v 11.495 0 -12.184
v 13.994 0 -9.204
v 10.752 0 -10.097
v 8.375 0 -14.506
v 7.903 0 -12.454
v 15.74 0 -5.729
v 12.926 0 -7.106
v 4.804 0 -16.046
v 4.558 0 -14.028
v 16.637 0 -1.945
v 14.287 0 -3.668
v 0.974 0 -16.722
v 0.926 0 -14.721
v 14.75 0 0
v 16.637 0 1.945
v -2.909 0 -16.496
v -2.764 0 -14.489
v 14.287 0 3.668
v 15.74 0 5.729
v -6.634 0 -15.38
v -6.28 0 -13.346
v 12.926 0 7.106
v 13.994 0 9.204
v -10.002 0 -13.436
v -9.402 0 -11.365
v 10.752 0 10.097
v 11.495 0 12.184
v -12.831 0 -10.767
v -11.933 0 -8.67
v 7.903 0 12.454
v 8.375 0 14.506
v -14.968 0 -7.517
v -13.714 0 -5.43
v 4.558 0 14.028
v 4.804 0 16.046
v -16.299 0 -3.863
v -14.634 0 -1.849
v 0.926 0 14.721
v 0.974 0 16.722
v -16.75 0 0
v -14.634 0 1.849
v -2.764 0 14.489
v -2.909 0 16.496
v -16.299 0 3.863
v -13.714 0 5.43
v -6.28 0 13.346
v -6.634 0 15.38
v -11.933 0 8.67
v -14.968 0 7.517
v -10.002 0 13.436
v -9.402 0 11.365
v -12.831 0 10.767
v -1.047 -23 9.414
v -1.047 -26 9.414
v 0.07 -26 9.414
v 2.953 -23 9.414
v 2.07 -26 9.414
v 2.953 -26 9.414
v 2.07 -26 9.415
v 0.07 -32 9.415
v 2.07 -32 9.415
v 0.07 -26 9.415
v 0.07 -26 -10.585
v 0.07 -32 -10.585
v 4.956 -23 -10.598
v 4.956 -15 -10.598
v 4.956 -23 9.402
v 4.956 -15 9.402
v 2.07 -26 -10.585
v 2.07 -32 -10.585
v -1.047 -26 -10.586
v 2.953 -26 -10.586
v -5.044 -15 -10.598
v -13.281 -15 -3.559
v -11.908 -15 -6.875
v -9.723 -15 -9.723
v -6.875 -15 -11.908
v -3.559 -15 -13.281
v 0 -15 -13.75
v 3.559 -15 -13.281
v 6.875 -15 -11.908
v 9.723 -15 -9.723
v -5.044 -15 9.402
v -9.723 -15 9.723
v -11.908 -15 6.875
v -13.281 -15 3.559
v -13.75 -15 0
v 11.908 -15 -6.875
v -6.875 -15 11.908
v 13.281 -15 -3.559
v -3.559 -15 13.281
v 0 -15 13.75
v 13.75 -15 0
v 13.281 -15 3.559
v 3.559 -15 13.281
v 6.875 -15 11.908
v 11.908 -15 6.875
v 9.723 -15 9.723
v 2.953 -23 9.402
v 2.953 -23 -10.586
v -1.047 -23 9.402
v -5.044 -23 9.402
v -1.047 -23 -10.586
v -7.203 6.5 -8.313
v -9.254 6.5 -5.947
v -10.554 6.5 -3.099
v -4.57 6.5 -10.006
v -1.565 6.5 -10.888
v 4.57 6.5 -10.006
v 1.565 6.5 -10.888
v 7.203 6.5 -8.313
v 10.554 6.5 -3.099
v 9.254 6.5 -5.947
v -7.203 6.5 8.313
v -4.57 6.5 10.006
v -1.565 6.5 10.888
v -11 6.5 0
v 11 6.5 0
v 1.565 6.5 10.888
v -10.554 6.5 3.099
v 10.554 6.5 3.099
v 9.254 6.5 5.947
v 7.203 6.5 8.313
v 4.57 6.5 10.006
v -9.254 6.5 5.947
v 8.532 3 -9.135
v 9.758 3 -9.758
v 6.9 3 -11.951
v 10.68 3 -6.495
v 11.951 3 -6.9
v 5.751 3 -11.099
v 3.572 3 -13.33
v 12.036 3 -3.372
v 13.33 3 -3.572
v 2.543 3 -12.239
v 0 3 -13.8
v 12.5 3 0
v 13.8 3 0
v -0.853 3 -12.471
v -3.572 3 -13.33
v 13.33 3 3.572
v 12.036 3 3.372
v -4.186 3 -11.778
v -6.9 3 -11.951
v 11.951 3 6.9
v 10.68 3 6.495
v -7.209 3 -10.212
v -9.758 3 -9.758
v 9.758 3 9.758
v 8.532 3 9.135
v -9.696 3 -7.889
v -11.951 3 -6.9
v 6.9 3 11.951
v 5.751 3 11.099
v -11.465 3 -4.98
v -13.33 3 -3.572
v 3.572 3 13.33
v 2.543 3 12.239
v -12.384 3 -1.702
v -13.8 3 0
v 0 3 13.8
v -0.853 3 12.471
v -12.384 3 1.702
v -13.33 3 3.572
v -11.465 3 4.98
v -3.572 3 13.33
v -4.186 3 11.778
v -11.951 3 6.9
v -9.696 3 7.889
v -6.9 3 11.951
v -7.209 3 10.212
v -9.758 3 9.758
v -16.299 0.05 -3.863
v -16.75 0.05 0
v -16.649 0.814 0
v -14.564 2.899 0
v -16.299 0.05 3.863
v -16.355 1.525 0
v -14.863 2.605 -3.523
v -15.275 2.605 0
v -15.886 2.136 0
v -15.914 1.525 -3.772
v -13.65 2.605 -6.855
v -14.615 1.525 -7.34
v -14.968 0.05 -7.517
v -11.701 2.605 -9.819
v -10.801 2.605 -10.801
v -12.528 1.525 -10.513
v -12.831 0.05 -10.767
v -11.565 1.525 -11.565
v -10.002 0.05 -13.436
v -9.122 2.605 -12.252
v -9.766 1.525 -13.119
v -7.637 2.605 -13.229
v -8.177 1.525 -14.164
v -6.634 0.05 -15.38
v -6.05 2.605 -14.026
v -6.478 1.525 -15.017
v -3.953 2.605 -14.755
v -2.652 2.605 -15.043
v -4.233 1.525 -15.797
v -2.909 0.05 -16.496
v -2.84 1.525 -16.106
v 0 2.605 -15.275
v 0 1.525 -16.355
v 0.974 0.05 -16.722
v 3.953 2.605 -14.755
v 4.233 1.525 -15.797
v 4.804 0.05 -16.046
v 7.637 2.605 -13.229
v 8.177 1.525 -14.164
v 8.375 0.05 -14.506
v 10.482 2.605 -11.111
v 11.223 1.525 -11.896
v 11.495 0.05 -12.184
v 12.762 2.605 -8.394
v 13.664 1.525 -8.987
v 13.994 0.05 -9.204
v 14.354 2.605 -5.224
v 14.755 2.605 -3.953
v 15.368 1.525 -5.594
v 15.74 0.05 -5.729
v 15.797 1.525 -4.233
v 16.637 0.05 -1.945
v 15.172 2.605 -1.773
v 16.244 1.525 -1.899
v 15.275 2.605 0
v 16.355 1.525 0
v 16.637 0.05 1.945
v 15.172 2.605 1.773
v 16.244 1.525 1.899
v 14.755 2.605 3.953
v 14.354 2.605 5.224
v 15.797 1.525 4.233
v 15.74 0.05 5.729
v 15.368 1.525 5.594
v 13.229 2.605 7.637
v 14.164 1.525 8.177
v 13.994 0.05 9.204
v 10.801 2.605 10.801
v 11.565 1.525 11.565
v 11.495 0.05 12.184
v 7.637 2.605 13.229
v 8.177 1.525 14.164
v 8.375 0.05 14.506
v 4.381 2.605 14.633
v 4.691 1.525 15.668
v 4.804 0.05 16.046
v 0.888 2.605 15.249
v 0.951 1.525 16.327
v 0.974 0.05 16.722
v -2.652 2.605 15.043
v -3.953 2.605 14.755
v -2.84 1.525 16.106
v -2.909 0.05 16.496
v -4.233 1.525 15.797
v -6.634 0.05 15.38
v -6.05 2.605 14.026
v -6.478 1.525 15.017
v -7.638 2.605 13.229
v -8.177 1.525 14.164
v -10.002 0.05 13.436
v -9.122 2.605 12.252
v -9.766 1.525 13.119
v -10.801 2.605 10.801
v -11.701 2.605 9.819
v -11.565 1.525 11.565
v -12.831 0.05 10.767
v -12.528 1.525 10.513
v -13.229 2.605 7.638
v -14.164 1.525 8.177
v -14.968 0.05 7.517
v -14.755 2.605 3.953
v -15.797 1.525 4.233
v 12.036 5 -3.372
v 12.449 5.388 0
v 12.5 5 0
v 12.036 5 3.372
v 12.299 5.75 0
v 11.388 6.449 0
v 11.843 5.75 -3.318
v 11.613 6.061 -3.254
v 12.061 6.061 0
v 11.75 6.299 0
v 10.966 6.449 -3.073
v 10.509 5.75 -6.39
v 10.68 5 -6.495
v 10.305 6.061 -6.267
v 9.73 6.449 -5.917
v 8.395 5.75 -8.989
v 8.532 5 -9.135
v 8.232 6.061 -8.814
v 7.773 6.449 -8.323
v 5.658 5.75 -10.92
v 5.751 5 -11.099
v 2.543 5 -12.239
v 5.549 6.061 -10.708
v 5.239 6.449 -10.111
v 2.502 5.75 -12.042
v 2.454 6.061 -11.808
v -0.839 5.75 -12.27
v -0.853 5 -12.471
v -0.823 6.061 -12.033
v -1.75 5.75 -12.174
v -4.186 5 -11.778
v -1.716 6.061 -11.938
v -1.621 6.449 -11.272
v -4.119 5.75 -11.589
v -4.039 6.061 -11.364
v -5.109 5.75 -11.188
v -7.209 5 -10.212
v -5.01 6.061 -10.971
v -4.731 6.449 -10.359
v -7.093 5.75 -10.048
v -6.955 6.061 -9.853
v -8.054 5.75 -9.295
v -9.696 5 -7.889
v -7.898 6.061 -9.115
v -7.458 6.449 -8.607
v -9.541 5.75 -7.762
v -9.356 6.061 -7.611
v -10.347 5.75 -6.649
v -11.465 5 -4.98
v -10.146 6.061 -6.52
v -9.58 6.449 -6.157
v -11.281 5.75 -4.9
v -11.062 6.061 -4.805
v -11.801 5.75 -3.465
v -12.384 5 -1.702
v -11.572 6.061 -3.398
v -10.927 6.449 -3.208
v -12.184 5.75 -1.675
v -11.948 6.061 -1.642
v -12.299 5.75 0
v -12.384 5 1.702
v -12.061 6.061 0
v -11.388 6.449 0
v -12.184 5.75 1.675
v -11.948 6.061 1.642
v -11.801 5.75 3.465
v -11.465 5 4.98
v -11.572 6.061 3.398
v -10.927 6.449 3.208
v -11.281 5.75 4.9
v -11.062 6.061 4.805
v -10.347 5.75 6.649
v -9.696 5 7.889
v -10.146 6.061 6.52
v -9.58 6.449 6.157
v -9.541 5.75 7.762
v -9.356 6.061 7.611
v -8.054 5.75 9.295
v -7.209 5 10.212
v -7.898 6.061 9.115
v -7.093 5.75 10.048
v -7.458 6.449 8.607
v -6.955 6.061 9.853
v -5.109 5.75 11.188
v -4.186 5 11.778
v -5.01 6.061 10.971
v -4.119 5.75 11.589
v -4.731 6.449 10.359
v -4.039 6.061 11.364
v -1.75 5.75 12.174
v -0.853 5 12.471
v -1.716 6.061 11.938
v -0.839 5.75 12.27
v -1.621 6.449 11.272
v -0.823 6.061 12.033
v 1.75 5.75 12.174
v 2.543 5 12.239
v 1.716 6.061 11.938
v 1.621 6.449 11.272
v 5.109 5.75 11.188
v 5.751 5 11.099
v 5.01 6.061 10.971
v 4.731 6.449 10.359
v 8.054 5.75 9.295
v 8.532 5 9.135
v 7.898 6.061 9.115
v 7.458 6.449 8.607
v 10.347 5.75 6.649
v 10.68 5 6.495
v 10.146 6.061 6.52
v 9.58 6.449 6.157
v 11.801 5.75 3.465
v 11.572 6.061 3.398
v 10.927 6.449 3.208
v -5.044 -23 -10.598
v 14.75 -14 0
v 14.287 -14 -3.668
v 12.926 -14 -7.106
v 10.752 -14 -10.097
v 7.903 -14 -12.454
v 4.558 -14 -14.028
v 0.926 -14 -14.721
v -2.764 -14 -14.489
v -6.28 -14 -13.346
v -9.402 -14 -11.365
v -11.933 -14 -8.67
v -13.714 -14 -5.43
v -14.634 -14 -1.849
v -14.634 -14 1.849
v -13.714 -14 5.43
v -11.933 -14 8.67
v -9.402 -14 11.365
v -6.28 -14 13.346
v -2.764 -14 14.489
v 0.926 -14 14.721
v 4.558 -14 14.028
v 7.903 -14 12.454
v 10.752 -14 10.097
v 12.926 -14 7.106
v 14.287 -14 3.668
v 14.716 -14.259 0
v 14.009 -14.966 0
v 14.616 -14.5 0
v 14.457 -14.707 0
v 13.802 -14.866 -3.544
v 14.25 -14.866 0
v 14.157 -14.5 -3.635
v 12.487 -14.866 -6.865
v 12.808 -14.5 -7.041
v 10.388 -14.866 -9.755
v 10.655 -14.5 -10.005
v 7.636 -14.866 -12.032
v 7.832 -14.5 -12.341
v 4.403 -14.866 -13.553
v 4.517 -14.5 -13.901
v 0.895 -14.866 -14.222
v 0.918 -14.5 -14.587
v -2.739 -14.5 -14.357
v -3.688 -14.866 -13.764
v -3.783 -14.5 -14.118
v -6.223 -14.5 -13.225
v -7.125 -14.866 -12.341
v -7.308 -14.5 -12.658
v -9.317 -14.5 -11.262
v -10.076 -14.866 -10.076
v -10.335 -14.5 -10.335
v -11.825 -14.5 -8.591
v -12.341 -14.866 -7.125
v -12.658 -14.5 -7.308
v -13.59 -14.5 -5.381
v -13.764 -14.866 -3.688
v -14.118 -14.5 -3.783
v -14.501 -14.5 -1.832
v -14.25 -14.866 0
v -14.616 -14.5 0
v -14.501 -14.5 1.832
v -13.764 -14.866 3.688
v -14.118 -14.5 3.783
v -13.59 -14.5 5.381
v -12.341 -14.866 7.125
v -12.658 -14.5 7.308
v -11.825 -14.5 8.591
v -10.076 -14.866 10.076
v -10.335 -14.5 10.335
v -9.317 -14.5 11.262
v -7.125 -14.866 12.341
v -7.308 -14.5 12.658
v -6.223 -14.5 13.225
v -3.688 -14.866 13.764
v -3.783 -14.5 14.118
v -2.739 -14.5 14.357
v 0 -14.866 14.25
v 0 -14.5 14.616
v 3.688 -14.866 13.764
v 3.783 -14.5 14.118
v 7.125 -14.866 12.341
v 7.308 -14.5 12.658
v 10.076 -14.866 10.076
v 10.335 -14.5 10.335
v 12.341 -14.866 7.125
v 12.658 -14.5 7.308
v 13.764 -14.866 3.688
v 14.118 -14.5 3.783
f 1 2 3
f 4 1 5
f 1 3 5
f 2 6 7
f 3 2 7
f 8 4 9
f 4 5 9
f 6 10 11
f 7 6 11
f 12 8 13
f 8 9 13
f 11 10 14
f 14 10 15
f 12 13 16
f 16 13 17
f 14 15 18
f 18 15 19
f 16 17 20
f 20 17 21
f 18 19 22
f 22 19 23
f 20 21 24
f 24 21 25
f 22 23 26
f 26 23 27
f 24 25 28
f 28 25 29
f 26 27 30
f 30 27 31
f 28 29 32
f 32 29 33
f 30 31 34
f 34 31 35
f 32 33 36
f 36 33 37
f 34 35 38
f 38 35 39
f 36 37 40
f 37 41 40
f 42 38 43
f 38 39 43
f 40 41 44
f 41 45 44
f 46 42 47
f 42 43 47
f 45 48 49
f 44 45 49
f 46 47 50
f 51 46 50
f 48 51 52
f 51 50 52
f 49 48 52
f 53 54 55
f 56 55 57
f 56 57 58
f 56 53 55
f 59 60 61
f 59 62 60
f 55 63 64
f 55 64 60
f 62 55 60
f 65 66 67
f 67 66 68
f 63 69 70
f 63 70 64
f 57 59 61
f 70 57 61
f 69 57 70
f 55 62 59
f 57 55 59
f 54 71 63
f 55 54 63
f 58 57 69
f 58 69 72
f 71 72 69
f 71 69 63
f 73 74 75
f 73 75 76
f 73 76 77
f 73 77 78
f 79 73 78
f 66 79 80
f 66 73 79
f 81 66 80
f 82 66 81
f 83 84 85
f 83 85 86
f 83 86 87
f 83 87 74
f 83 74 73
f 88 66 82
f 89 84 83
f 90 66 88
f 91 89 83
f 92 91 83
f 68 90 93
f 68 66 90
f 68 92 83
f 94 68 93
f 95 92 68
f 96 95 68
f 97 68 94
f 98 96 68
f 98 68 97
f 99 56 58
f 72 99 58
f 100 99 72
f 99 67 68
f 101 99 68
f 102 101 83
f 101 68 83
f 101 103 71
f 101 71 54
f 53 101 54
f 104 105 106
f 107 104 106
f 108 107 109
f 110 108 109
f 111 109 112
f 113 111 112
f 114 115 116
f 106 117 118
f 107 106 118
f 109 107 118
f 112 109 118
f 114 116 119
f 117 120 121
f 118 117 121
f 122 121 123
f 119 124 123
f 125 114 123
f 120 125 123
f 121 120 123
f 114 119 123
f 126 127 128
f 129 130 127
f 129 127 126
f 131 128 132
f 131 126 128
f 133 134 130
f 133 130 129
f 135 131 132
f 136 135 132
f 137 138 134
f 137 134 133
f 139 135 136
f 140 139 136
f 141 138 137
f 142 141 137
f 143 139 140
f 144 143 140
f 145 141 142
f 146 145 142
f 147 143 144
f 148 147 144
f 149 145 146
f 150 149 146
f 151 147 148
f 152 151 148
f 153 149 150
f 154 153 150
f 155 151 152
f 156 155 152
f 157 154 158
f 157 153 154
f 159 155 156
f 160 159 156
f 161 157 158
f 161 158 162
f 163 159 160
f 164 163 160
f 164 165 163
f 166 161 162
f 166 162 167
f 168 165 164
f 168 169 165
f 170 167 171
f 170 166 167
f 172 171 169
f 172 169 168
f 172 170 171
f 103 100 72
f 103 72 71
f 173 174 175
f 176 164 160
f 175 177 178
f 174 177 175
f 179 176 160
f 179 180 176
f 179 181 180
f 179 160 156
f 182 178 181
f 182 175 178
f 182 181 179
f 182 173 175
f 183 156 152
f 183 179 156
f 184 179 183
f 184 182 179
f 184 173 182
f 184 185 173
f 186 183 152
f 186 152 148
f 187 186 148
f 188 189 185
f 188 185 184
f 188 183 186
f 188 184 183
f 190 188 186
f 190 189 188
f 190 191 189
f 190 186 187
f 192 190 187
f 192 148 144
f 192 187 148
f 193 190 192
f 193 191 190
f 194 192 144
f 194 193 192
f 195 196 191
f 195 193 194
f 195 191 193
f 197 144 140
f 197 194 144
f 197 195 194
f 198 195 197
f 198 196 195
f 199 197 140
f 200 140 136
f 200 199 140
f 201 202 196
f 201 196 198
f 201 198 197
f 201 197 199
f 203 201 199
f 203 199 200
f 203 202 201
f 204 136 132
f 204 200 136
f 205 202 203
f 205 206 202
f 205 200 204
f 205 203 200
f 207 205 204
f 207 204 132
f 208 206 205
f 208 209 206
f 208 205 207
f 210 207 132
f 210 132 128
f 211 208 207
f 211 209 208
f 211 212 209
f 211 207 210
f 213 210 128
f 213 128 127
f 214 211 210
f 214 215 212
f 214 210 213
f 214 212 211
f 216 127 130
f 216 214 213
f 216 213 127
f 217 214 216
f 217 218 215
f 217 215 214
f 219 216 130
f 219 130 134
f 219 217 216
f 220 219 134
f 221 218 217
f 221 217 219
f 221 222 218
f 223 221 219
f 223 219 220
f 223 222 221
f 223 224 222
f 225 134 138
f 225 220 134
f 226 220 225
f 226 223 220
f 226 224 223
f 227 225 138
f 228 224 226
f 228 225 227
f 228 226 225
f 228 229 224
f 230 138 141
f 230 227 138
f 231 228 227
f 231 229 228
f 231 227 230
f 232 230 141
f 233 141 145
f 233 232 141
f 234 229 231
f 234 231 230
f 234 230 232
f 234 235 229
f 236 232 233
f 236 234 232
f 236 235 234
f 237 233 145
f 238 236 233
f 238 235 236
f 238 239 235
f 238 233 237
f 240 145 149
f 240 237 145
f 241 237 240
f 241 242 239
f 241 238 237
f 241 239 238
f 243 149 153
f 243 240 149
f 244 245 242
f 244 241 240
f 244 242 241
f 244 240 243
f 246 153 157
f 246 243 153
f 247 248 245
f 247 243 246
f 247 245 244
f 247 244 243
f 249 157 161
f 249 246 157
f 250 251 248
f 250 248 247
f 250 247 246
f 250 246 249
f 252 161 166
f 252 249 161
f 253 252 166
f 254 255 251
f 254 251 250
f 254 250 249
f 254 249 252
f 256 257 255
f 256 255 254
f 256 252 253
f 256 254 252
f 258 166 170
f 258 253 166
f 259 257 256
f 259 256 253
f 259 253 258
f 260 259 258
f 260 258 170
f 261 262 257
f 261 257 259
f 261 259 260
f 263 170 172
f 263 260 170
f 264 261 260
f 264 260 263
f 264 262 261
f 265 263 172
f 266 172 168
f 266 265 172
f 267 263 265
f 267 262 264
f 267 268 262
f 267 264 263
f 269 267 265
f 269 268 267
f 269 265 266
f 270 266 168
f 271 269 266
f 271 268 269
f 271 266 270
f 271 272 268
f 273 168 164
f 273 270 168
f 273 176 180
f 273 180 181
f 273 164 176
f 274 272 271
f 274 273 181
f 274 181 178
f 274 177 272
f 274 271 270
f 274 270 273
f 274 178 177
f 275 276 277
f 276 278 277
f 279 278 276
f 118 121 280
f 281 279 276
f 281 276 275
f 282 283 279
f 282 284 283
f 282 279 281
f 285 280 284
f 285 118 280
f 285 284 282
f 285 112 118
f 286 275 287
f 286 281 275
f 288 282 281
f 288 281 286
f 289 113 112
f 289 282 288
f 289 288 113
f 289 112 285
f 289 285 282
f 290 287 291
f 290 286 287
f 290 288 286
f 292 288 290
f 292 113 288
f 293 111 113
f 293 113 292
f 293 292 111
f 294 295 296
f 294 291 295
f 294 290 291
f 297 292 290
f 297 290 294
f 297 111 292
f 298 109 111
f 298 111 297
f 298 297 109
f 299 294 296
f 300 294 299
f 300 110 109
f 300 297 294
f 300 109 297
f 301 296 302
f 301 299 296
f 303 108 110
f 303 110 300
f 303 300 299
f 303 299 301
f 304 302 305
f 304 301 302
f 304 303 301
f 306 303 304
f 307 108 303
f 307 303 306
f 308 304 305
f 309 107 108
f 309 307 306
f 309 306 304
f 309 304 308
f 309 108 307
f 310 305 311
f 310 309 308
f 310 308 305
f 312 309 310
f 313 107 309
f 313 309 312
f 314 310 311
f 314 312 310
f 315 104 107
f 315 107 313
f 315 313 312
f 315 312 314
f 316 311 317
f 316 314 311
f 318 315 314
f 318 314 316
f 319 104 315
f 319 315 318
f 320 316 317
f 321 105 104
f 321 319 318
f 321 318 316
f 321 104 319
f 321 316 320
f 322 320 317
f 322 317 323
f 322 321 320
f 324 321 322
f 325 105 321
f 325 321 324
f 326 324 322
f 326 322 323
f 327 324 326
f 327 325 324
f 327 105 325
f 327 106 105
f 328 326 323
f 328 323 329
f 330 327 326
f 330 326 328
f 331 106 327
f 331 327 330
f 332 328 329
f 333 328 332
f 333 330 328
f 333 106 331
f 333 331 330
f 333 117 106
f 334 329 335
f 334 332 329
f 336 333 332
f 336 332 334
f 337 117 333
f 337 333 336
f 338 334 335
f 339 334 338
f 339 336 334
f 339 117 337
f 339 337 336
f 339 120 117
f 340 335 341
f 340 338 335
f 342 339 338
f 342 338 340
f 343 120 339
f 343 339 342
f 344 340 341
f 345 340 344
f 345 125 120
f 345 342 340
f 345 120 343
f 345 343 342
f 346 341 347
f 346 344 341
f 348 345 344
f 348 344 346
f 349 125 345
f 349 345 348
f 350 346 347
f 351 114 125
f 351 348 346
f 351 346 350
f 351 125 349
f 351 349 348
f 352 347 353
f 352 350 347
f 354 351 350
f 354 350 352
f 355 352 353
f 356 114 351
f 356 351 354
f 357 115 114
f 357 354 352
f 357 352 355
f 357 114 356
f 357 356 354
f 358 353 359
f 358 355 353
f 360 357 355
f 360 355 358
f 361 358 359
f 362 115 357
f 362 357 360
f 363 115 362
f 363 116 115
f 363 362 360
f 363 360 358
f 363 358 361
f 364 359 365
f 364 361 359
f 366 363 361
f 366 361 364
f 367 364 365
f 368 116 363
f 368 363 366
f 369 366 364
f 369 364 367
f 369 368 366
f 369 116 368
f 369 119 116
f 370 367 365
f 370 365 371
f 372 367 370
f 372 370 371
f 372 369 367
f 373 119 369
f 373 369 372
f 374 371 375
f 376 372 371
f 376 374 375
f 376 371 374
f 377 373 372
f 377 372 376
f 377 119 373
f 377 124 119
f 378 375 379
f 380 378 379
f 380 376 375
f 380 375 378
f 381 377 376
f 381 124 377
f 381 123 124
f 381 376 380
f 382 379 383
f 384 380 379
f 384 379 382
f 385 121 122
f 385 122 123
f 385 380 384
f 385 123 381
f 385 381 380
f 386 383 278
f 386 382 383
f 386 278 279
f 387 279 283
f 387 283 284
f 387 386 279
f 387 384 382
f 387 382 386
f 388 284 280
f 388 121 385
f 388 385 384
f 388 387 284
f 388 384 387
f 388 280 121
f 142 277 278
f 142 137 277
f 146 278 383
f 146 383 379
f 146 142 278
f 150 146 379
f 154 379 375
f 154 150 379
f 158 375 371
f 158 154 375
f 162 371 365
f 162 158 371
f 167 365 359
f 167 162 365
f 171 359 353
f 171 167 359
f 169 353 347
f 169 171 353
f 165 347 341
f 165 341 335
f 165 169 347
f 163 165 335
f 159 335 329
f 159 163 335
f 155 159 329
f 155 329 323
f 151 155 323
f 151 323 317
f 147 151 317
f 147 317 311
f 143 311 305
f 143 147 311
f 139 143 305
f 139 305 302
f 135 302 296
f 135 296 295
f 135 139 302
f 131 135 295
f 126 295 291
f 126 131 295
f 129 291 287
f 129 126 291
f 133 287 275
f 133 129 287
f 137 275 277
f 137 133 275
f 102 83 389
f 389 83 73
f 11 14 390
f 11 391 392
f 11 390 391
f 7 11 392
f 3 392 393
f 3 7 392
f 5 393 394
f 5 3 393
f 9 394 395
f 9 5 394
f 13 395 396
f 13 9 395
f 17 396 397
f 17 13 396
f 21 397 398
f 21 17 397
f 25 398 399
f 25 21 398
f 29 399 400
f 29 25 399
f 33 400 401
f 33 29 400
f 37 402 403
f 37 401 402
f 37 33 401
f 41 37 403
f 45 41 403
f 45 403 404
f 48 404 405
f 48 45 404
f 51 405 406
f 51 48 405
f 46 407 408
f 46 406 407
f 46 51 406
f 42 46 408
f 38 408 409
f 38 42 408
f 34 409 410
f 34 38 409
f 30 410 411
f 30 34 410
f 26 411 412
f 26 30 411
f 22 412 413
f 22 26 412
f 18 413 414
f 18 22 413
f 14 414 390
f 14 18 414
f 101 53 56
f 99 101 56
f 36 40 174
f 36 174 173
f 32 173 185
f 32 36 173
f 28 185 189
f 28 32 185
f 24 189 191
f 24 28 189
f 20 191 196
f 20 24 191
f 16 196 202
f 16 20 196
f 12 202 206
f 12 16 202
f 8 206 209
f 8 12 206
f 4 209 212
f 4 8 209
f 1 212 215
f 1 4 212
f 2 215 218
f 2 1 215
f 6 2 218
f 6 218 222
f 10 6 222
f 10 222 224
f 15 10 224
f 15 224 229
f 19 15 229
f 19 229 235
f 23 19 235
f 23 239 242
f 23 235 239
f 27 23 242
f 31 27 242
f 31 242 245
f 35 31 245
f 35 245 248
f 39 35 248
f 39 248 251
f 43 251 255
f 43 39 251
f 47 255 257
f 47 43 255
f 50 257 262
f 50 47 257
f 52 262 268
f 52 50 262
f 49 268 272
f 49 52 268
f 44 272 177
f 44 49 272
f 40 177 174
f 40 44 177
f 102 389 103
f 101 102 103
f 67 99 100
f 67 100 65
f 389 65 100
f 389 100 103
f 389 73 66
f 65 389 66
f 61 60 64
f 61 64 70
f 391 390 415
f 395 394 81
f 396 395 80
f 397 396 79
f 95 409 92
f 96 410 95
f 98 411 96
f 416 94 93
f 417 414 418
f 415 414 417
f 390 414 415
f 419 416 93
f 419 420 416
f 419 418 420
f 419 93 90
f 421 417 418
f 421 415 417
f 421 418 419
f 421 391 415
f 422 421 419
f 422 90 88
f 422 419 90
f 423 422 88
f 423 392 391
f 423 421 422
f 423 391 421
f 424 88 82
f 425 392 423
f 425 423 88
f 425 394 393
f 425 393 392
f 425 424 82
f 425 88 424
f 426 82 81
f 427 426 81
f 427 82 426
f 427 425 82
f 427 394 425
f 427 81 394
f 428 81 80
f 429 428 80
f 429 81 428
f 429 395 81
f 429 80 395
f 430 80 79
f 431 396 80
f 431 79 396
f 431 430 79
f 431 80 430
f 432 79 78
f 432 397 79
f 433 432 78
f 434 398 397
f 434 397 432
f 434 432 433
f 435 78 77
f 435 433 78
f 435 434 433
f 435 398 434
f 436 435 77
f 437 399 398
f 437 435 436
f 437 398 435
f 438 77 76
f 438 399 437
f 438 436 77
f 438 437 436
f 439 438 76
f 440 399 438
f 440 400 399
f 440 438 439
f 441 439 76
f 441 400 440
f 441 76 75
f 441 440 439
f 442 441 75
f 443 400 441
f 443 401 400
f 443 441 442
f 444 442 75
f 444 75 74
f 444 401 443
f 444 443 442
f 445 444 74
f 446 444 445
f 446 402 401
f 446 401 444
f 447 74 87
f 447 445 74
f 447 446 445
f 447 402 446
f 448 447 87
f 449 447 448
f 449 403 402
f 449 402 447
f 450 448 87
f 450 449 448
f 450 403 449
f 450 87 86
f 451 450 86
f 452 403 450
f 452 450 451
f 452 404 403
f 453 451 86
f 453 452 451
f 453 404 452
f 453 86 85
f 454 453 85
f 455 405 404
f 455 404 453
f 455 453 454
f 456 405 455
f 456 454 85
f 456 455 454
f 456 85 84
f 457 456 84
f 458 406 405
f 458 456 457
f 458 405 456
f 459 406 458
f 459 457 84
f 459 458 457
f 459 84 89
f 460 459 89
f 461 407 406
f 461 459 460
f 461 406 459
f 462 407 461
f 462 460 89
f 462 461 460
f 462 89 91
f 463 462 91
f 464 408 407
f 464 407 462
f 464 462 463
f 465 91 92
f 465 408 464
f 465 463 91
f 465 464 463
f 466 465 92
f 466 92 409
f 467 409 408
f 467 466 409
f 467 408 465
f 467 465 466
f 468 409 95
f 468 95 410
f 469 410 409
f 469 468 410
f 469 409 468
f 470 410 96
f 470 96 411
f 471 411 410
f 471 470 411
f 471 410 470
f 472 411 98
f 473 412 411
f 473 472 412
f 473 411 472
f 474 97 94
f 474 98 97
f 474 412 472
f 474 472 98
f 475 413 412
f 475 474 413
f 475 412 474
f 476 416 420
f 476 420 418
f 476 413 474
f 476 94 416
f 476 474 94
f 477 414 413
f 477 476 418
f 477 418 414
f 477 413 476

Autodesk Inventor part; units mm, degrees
ref_plane "YZ Plane" through (0, 0, 0) normal (1, 0, 0) x (0, 1, 0)
ref_plane "XZ Plane" through (0, 0, 0) normal (0, 1, 0) x (-1, 0, 0)
ref_plane "XY Plane" through (0, 0, 0) normal (0, 0, 1) x (1, 0, 0)
sketch "Sketch1" plane through (0, 0, 0) normal (0, 1, 0) x (-1, 0, 0)
  circle A0 centre (0, 0) radius 12.5
  circle A1 centre (0, 0) radius 16.75
  dimension "d0" = 25
  dimension "d1" = 33.5
extrude "Extrusion1" add sketch "Sketch1" along normal blind 3
sketch "Sketch2" plane through (0, 0, 0) normal (0, -1, 0) x (1, 0, 0)
  circle A0 centre (0, 0) radius 12.5 projected
  circle A1 centre (0, 0) radius 12.5
  dimension "d6" = 25
extrude "Extrusion2" add sketch "Sketch2" against normal blind 6.5
fillet "Fillet1" radius 1.5 1 edges at (-12.5, 6.5, 0)
fillet "Fillet2" radius 2.95 1 edges at (16.75, 3, 0)
sketch "Sketch5" plane through (0, 0, 0) normal (0, -1, 0) x (1, 0, 0)
  circle A0 centre (0, 0) radius 16.75 projected
  circle A1 centre (0, 0) radius 14.75
  dimension "d23" = 29.5
extrude "Extrusion5" add sketch "Sketch5" along normal blind 15 contours A1
sketch "Sketch7" plane through (0, -15, 0) normal (0, -1, 0) x (1, 0, 0)
  line L0 (4.9559, 9.4025) -> (-5.0441, 9.4025)
  line L1 (-5.0441, 9.4025) -> (-5.0441, -10.5975)
  line L2 (-5.0441, -10.5975) -> (4.9559, -10.5975)
  line L3 (4.9559, -10.5975) -> (4.9559, 9.4025)
  point P0 (0, 0)
  dimension "d30" = 10
  dimension "d32" = 20
extrude "Extrusion7" add sketch "Sketch7" along normal blind 8
sketch "Sketch8" plane through (0, -23, 0) normal (0, -1, 0) x (1, 0, 0)
  line L0 (-1.0467, 9.4141) -> (2.9533, 9.4141)
  line L1 (2.9533, 9.4141) -> (2.9533, -10.5859)
  line L2 (2.9533, -10.5859) -> (-1.0467, -10.5859)
  line L3 (-1.0467, -10.5859) -> (-1.0467, 9.4141)
  point P0 (0, 0)
  dimension "d35" = 4
  dimension "d37" = 20
extrude "Extrusion8" add sketch "Sketch8" along normal blind 3
sketch "Sketch10" plane through (0, -26, 0) normal (0, -1, 0) x (1, 0, 0)
  line L0 (0.0695, 9.4148) -> (2.0695, 9.4148)
  line L1 (2.0695, 9.4148) -> (2.0695, -10.5852)
  line L2 (2.0695, -10.5852) -> (0.0695, -10.5852)
  line L3 (0.0695, -10.5852) -> (0.0695, 9.4148)
  point P0 (0, 0)
  dimension "d46" = 20
  dimension "d48" = 2
extrude "Extrusion10" add sketch "Sketch10" along normal blind 6
fillet "Fillet3" radius 1 1 edges at (-14.75, -15, 0)
properties part number "OBSF-30-B_button" material "Nylon 6"
